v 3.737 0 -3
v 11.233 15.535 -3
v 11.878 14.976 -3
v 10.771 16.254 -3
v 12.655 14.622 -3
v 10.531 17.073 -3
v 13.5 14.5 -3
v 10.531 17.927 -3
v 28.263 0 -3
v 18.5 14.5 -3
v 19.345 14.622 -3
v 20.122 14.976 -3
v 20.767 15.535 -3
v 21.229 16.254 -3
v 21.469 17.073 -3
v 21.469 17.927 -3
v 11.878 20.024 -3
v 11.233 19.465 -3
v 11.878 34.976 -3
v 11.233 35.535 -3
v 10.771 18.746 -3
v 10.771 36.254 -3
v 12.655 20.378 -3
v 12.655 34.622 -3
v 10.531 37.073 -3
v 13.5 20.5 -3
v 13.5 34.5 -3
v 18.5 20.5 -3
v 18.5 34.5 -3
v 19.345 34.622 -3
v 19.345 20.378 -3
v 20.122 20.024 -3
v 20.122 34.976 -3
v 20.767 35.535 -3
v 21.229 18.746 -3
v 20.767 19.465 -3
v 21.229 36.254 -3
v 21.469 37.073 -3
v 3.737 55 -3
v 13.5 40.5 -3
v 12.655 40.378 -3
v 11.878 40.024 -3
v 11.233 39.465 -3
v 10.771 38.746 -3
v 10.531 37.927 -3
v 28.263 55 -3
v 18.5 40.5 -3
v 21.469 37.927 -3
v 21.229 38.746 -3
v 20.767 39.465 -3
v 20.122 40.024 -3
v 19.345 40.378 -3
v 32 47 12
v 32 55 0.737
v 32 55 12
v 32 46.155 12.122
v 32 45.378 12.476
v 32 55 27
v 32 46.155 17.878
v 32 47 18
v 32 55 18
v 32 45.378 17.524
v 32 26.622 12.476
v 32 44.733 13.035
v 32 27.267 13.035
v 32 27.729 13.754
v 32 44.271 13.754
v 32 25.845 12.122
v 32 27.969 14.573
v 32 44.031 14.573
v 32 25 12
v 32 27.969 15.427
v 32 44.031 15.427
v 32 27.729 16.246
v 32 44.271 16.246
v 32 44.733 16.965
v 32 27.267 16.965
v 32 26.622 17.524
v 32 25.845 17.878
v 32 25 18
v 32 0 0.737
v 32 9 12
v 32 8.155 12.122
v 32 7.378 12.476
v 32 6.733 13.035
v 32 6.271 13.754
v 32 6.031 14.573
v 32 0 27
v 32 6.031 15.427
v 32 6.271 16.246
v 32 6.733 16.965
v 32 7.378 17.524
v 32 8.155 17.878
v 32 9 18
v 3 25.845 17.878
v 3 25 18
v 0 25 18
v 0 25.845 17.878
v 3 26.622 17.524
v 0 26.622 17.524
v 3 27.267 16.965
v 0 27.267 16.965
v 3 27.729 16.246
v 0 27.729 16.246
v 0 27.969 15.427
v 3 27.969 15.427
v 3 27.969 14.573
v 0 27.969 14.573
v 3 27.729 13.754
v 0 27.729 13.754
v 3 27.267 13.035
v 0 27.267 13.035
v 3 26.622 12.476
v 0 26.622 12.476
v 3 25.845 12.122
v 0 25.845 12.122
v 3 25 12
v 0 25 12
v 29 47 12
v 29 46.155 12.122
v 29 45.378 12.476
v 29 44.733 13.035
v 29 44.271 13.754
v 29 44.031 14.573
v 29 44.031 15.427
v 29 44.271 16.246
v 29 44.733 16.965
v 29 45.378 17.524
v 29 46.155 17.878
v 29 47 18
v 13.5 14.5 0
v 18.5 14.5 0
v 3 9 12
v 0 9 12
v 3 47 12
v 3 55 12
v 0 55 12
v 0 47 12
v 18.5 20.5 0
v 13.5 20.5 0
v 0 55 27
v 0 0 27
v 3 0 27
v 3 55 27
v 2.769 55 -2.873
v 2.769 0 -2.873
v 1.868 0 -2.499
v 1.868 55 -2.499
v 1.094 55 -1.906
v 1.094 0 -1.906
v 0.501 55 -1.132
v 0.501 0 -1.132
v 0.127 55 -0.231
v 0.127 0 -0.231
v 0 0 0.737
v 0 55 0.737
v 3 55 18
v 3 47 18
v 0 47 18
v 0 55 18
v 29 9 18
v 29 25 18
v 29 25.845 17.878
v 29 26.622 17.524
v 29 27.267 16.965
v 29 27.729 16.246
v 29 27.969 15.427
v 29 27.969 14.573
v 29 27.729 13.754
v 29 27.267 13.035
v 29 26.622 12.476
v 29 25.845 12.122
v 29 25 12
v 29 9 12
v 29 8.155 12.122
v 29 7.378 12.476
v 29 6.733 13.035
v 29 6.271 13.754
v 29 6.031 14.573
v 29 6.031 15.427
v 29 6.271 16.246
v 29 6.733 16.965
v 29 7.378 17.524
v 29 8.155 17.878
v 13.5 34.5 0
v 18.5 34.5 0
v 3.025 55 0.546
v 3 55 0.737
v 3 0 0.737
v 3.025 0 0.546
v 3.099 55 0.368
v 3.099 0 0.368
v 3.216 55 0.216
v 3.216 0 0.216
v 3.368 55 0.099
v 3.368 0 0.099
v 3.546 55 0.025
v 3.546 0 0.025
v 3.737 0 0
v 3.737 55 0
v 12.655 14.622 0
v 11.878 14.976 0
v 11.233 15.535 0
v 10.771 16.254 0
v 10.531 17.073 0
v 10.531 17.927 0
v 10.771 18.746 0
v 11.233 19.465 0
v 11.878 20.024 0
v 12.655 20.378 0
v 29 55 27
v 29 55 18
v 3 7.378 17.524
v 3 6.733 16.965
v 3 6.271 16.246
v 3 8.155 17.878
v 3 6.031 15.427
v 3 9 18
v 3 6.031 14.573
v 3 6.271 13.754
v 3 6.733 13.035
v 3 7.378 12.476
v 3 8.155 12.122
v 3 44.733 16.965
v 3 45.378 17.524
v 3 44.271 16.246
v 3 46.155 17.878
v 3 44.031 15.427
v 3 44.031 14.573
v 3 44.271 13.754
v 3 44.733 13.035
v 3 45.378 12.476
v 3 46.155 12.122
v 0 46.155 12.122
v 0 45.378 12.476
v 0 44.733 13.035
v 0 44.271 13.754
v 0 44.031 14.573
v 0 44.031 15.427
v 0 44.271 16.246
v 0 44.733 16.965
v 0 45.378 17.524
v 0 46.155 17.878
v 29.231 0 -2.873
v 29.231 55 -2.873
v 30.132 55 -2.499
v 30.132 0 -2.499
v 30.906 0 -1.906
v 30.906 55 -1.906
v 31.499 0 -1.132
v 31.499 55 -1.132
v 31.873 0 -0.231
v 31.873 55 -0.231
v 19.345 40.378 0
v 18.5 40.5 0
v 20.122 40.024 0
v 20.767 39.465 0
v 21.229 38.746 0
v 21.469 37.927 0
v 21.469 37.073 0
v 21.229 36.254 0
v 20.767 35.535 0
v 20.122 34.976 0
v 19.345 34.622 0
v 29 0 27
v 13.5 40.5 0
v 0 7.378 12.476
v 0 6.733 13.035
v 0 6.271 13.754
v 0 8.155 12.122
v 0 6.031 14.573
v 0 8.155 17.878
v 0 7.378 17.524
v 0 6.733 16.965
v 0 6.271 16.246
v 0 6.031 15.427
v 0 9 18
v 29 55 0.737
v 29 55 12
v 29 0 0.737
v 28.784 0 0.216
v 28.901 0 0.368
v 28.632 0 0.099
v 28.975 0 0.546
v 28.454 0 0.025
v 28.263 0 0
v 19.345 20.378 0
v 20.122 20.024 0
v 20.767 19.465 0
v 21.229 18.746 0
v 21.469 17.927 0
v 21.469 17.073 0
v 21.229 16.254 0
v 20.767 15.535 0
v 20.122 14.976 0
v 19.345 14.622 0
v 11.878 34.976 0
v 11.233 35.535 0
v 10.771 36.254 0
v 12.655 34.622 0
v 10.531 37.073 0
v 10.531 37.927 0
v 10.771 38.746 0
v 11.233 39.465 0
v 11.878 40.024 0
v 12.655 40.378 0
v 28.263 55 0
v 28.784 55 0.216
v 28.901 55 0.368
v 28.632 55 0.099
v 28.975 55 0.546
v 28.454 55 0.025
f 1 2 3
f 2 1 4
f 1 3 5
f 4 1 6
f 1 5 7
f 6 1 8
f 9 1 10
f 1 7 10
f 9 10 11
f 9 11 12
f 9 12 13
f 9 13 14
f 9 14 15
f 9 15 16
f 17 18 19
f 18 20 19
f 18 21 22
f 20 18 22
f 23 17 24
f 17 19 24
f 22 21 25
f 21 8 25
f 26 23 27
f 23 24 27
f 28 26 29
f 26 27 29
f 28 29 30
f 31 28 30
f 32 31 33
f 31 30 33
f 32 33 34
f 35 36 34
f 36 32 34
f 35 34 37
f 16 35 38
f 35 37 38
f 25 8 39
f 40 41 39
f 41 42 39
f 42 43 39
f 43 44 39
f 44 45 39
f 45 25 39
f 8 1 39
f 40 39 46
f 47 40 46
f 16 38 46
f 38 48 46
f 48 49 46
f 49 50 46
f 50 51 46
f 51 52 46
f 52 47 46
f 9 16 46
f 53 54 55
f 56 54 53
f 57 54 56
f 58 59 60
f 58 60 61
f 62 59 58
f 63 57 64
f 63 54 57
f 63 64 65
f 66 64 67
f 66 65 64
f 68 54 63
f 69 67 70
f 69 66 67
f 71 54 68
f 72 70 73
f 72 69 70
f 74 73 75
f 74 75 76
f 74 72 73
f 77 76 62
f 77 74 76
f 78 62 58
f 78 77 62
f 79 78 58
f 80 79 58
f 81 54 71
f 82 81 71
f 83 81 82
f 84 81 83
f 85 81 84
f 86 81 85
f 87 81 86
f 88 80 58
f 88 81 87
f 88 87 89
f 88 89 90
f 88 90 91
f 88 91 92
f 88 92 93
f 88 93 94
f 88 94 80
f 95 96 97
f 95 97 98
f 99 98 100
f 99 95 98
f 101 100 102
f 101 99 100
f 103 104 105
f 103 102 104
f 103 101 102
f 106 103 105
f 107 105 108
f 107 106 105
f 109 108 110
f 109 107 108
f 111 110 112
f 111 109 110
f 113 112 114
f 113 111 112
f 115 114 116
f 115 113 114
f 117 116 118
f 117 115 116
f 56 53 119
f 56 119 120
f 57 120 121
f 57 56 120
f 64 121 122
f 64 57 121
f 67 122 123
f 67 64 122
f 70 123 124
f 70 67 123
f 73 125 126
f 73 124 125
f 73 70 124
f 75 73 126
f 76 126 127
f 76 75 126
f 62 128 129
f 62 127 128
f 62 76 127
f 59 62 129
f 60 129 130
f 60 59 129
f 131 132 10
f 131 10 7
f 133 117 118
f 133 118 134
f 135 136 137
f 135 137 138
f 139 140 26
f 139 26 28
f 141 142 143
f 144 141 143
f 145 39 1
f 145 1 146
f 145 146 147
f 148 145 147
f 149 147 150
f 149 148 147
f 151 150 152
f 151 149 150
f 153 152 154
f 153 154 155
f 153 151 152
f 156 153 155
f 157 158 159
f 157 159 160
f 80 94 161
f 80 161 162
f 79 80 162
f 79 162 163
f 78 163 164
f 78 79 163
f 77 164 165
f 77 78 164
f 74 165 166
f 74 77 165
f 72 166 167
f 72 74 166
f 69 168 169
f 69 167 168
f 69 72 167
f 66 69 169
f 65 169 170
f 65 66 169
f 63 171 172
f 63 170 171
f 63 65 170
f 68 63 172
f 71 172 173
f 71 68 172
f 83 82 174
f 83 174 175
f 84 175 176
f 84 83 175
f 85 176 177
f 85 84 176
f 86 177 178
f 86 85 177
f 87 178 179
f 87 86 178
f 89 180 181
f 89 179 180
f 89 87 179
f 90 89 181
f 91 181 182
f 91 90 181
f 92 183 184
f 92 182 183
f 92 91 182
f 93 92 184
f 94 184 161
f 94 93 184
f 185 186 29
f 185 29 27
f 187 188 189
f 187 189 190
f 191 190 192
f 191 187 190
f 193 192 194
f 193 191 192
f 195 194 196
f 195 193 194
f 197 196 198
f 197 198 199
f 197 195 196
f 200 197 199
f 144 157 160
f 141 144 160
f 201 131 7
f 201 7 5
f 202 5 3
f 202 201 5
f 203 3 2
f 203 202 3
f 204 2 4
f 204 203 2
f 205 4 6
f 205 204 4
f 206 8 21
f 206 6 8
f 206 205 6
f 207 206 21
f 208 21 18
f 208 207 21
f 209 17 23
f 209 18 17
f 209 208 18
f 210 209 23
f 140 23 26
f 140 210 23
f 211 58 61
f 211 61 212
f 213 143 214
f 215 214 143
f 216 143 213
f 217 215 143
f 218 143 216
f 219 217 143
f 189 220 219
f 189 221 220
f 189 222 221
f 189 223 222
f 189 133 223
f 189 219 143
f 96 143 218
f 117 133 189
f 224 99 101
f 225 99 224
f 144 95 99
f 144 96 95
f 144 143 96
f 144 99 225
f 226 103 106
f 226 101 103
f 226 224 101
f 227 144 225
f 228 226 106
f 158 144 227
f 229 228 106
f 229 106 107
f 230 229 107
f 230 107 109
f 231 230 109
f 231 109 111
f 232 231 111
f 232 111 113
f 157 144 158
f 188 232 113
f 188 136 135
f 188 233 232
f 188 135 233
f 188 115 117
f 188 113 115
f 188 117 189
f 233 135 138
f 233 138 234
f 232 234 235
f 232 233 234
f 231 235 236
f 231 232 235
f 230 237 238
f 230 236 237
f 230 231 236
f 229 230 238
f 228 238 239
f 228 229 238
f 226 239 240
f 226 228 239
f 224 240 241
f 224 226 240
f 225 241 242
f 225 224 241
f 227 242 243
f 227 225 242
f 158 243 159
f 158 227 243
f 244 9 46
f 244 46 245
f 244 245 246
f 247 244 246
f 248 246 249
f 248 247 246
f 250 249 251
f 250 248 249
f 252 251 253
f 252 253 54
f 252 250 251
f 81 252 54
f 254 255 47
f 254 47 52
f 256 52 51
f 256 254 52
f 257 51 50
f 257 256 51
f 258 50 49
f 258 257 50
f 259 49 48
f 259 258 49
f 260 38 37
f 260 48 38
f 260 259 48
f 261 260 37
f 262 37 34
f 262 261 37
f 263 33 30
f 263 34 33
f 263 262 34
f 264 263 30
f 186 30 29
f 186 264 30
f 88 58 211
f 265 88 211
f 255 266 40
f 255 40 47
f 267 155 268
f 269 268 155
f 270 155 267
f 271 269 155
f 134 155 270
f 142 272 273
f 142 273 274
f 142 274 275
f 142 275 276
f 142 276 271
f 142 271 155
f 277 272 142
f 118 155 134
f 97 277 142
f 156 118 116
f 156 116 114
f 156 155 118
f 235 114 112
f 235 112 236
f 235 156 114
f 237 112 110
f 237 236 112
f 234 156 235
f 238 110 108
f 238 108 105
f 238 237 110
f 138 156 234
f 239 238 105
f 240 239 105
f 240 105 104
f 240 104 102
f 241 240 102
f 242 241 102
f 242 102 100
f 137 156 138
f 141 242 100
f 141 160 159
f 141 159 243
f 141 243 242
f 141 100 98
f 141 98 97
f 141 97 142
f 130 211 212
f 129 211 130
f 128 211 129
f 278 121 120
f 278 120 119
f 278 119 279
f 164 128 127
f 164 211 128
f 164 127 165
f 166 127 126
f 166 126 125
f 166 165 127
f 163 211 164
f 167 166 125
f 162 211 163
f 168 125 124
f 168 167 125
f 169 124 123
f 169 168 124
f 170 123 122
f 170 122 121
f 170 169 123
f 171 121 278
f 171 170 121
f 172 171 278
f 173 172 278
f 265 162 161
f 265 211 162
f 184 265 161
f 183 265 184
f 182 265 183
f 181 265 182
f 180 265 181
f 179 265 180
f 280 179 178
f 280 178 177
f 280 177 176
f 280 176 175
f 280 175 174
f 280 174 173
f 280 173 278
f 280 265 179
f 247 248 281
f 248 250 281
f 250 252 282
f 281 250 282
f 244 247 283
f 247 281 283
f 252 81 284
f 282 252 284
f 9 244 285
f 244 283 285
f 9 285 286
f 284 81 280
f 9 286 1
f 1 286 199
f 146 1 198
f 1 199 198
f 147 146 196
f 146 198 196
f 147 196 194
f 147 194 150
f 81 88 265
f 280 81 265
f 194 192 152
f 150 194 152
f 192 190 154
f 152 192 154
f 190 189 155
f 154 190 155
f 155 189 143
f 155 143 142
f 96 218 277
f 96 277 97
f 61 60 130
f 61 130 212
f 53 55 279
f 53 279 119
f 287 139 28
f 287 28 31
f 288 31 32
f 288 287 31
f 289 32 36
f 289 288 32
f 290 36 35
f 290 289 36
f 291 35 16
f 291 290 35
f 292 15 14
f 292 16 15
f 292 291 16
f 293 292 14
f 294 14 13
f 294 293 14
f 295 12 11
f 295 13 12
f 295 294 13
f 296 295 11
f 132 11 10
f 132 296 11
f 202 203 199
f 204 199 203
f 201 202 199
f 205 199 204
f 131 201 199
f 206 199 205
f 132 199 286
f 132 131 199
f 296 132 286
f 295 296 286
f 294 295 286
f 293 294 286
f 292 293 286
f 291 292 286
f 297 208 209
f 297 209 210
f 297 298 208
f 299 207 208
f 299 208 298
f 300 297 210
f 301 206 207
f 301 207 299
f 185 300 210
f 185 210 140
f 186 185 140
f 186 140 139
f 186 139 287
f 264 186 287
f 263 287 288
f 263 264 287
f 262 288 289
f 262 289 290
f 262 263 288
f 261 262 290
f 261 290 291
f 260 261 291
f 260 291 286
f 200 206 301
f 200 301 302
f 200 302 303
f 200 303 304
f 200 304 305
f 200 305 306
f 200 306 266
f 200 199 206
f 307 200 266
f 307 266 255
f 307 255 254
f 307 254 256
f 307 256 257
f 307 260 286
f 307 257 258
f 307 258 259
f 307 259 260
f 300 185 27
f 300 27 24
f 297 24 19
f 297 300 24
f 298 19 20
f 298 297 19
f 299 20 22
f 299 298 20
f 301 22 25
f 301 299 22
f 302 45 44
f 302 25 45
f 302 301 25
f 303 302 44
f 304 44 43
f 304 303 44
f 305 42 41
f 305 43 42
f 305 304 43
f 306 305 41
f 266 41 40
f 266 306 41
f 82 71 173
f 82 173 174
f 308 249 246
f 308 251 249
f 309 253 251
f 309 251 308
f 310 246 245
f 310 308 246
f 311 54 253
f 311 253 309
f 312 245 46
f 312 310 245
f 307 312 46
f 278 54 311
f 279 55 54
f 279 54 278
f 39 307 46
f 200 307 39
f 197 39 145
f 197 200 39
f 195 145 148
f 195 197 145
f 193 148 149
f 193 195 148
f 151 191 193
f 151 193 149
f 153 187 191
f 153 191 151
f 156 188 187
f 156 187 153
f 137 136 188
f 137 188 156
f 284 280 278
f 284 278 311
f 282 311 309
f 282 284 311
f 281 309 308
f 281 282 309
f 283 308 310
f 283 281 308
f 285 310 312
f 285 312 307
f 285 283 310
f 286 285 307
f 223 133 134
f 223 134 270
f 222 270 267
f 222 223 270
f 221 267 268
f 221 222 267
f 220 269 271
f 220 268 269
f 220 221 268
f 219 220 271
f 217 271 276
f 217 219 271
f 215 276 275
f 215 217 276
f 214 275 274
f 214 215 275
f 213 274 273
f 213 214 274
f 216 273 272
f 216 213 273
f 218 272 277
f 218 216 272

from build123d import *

# Parameters (mm, degrees)
SKETCH1_W                      = 32
SKETCH1_H                      = 55
BASE_FLANGE1_DEPTH             = 3
EDGE_FLANGE1_STRIP_W           = 13.4732
EDGE_FLANGE1_STRIP_H           = 3
EDGE_FLANGE1_STRIP_CUT_DEPTH   = 55
EDGE_FLANGE1_STRIP_2_W         = 13.4732
EDGE_FLANGE1_STRIP_2_H         = 3
EDGE_FLANGE1_STRIP_CUT_2_DEPTH = 55
EDGE_FLANGE1_DEPTH             = 55
EDGE_FLANGE1_BEND_DEPTH        = 55
CUT_EXTRUDE1_DEPTH             = 70.123078635
CUT_EXTRUDE2_DEPTH             = 70.123078635


# Sheet-metal steps are written as plain solids
with BuildPart() as part:
    # Sketch1 → Base-Flange1 (new body)
    with BuildSketch(Plane.XY):
        with Locations((16, 27.5)):
            Rectangle(SKETCH1_W, SKETCH1_H)
    extrude(amount=-BASE_FLANGE1_DEPTH)

    # Edge-Flange1 strip (across the edge) → Edge-Flange1 strip cut (cut)
    with BuildSketch(Plane(origin=(32, 0, 0), x_dir=(-1, 0, 0), z_dir=(0, 1, 0))):
        with Locations((-3, -1.5)):
            Rectangle(EDGE_FLANGE1_STRIP_W, EDGE_FLANGE1_STRIP_H)
    extrude(amount=EDGE_FLANGE1_STRIP_CUT_DEPTH, mode=Mode.SUBTRACT)

    # Edge-Flange1 strip 2 (across the edge) → Edge-Flange1 strip cut 2 (cut)
    with BuildSketch(Plane.XZ.offset(-55)):
        with Locations((-3, -1.5)):
            Rectangle(EDGE_FLANGE1_STRIP_2_W, EDGE_FLANGE1_STRIP_2_H)
    extrude(amount=EDGE_FLANGE1_STRIP_CUT_2_DEPTH, mode=Mode.SUBTRACT)

    # Edge-Flange1 section (across the edge) → Edge-Flange1 (add)
    with BuildSketch(Plane(origin=(32, 0, 0), x_dir=(-1, 0, 0), z_dir=(0, 1, 0))):
        with BuildLine():
            Line((0, 0.7366), (0, 27))
            Line((0, 27), (3, 27))
            Line((3, 27), (3, 0.7366))
            ThreePointArc((3, 0.7366), (3.215745145, 0.215745145), (3.7366, 0))
            Line((3.7366, 0), (3.7366, -3))
            ThreePointArc((3.7366, -3), (1.094424801, -1.905575199), (0, 0.7366))
        make_face()
    extrude(amount=EDGE_FLANGE1_DEPTH)

    # Edge-Flange1 section 2 (across the edge) → Edge-Flange1 bend (add)
    with BuildSketch(Plane.XZ.offset(-55)):
        with BuildLine():
            Line((0, 0.7366), (0, 27))
            Line((0, 27), (3, 27))
            Line((3, 27), (3, 0.7366))
            ThreePointArc((3, 0.7366), (3.215745145, 0.215745145), (3.7366, 0))
            Line((3.7366, 0), (3.7366, -3))
            ThreePointArc((3.7366, -3), (1.094424801, -1.905575199), (0, 0.7366))
        make_face()
    extrude(amount=EDGE_FLANGE1_BEND_DEPTH)

    # Sketch12 → Cut-Extrude1 (cut, through all)
    with BuildSketch(Plane.XY):
        with BuildLine():
            Line((13.5, 40.5), (18.5, 40.5))
            ThreePointArc((18.5, 40.5), (21.5, 37.5), (18.5, 34.5))
            Line((18.5, 34.5), (13.5, 34.5))
            ThreePointArc((13.5, 34.5), (10.5, 37.5), (13.5, 40.5))
        make_face()
        with BuildLine():
            Line((13.5, 20.5), (18.5, 20.5))
            ThreePointArc((18.5, 20.5), (21.5, 17.5), (18.5, 14.5))
            Line((18.5, 14.5), (13.5, 14.5))
            ThreePointArc((13.5, 14.5), (10.5, 17.5), (13.5, 20.5))
        make_face()
    extrude(amount=-CUT_EXTRUDE1_DEPTH, mode=Mode.SUBTRACT)

    # Sketch13 → Cut-Extrude2 (cut, through all)
    with BuildSketch(Plane(origin=(32, 0, 0), x_dir=(0, 0, -1), z_dir=(1, 0, 0))):
        with BuildLine():
            Line((-12, 55), (-12, 47))
            ThreePointArc((-12, 47), (-15, 44), (-18, 47))
            Line((-18, 47), (-18, 55))
            ThreePointArc((-18, 55), (-15, 58), (-12, 55))
        make_face()
        with BuildLine():
            Line((-12, 25), (-12, 9))
            ThreePointArc((-12, 9), (-15, 6), (-18, 9))
            Line((-18, 9), (-18, 25))
            ThreePointArc((-18, 25), (-15, 28), (-12, 25))
        make_face()
    extrude(amount=-CUT_EXTRUDE2_DEPTH, mode=Mode.SUBTRACT)


solid = part.part
